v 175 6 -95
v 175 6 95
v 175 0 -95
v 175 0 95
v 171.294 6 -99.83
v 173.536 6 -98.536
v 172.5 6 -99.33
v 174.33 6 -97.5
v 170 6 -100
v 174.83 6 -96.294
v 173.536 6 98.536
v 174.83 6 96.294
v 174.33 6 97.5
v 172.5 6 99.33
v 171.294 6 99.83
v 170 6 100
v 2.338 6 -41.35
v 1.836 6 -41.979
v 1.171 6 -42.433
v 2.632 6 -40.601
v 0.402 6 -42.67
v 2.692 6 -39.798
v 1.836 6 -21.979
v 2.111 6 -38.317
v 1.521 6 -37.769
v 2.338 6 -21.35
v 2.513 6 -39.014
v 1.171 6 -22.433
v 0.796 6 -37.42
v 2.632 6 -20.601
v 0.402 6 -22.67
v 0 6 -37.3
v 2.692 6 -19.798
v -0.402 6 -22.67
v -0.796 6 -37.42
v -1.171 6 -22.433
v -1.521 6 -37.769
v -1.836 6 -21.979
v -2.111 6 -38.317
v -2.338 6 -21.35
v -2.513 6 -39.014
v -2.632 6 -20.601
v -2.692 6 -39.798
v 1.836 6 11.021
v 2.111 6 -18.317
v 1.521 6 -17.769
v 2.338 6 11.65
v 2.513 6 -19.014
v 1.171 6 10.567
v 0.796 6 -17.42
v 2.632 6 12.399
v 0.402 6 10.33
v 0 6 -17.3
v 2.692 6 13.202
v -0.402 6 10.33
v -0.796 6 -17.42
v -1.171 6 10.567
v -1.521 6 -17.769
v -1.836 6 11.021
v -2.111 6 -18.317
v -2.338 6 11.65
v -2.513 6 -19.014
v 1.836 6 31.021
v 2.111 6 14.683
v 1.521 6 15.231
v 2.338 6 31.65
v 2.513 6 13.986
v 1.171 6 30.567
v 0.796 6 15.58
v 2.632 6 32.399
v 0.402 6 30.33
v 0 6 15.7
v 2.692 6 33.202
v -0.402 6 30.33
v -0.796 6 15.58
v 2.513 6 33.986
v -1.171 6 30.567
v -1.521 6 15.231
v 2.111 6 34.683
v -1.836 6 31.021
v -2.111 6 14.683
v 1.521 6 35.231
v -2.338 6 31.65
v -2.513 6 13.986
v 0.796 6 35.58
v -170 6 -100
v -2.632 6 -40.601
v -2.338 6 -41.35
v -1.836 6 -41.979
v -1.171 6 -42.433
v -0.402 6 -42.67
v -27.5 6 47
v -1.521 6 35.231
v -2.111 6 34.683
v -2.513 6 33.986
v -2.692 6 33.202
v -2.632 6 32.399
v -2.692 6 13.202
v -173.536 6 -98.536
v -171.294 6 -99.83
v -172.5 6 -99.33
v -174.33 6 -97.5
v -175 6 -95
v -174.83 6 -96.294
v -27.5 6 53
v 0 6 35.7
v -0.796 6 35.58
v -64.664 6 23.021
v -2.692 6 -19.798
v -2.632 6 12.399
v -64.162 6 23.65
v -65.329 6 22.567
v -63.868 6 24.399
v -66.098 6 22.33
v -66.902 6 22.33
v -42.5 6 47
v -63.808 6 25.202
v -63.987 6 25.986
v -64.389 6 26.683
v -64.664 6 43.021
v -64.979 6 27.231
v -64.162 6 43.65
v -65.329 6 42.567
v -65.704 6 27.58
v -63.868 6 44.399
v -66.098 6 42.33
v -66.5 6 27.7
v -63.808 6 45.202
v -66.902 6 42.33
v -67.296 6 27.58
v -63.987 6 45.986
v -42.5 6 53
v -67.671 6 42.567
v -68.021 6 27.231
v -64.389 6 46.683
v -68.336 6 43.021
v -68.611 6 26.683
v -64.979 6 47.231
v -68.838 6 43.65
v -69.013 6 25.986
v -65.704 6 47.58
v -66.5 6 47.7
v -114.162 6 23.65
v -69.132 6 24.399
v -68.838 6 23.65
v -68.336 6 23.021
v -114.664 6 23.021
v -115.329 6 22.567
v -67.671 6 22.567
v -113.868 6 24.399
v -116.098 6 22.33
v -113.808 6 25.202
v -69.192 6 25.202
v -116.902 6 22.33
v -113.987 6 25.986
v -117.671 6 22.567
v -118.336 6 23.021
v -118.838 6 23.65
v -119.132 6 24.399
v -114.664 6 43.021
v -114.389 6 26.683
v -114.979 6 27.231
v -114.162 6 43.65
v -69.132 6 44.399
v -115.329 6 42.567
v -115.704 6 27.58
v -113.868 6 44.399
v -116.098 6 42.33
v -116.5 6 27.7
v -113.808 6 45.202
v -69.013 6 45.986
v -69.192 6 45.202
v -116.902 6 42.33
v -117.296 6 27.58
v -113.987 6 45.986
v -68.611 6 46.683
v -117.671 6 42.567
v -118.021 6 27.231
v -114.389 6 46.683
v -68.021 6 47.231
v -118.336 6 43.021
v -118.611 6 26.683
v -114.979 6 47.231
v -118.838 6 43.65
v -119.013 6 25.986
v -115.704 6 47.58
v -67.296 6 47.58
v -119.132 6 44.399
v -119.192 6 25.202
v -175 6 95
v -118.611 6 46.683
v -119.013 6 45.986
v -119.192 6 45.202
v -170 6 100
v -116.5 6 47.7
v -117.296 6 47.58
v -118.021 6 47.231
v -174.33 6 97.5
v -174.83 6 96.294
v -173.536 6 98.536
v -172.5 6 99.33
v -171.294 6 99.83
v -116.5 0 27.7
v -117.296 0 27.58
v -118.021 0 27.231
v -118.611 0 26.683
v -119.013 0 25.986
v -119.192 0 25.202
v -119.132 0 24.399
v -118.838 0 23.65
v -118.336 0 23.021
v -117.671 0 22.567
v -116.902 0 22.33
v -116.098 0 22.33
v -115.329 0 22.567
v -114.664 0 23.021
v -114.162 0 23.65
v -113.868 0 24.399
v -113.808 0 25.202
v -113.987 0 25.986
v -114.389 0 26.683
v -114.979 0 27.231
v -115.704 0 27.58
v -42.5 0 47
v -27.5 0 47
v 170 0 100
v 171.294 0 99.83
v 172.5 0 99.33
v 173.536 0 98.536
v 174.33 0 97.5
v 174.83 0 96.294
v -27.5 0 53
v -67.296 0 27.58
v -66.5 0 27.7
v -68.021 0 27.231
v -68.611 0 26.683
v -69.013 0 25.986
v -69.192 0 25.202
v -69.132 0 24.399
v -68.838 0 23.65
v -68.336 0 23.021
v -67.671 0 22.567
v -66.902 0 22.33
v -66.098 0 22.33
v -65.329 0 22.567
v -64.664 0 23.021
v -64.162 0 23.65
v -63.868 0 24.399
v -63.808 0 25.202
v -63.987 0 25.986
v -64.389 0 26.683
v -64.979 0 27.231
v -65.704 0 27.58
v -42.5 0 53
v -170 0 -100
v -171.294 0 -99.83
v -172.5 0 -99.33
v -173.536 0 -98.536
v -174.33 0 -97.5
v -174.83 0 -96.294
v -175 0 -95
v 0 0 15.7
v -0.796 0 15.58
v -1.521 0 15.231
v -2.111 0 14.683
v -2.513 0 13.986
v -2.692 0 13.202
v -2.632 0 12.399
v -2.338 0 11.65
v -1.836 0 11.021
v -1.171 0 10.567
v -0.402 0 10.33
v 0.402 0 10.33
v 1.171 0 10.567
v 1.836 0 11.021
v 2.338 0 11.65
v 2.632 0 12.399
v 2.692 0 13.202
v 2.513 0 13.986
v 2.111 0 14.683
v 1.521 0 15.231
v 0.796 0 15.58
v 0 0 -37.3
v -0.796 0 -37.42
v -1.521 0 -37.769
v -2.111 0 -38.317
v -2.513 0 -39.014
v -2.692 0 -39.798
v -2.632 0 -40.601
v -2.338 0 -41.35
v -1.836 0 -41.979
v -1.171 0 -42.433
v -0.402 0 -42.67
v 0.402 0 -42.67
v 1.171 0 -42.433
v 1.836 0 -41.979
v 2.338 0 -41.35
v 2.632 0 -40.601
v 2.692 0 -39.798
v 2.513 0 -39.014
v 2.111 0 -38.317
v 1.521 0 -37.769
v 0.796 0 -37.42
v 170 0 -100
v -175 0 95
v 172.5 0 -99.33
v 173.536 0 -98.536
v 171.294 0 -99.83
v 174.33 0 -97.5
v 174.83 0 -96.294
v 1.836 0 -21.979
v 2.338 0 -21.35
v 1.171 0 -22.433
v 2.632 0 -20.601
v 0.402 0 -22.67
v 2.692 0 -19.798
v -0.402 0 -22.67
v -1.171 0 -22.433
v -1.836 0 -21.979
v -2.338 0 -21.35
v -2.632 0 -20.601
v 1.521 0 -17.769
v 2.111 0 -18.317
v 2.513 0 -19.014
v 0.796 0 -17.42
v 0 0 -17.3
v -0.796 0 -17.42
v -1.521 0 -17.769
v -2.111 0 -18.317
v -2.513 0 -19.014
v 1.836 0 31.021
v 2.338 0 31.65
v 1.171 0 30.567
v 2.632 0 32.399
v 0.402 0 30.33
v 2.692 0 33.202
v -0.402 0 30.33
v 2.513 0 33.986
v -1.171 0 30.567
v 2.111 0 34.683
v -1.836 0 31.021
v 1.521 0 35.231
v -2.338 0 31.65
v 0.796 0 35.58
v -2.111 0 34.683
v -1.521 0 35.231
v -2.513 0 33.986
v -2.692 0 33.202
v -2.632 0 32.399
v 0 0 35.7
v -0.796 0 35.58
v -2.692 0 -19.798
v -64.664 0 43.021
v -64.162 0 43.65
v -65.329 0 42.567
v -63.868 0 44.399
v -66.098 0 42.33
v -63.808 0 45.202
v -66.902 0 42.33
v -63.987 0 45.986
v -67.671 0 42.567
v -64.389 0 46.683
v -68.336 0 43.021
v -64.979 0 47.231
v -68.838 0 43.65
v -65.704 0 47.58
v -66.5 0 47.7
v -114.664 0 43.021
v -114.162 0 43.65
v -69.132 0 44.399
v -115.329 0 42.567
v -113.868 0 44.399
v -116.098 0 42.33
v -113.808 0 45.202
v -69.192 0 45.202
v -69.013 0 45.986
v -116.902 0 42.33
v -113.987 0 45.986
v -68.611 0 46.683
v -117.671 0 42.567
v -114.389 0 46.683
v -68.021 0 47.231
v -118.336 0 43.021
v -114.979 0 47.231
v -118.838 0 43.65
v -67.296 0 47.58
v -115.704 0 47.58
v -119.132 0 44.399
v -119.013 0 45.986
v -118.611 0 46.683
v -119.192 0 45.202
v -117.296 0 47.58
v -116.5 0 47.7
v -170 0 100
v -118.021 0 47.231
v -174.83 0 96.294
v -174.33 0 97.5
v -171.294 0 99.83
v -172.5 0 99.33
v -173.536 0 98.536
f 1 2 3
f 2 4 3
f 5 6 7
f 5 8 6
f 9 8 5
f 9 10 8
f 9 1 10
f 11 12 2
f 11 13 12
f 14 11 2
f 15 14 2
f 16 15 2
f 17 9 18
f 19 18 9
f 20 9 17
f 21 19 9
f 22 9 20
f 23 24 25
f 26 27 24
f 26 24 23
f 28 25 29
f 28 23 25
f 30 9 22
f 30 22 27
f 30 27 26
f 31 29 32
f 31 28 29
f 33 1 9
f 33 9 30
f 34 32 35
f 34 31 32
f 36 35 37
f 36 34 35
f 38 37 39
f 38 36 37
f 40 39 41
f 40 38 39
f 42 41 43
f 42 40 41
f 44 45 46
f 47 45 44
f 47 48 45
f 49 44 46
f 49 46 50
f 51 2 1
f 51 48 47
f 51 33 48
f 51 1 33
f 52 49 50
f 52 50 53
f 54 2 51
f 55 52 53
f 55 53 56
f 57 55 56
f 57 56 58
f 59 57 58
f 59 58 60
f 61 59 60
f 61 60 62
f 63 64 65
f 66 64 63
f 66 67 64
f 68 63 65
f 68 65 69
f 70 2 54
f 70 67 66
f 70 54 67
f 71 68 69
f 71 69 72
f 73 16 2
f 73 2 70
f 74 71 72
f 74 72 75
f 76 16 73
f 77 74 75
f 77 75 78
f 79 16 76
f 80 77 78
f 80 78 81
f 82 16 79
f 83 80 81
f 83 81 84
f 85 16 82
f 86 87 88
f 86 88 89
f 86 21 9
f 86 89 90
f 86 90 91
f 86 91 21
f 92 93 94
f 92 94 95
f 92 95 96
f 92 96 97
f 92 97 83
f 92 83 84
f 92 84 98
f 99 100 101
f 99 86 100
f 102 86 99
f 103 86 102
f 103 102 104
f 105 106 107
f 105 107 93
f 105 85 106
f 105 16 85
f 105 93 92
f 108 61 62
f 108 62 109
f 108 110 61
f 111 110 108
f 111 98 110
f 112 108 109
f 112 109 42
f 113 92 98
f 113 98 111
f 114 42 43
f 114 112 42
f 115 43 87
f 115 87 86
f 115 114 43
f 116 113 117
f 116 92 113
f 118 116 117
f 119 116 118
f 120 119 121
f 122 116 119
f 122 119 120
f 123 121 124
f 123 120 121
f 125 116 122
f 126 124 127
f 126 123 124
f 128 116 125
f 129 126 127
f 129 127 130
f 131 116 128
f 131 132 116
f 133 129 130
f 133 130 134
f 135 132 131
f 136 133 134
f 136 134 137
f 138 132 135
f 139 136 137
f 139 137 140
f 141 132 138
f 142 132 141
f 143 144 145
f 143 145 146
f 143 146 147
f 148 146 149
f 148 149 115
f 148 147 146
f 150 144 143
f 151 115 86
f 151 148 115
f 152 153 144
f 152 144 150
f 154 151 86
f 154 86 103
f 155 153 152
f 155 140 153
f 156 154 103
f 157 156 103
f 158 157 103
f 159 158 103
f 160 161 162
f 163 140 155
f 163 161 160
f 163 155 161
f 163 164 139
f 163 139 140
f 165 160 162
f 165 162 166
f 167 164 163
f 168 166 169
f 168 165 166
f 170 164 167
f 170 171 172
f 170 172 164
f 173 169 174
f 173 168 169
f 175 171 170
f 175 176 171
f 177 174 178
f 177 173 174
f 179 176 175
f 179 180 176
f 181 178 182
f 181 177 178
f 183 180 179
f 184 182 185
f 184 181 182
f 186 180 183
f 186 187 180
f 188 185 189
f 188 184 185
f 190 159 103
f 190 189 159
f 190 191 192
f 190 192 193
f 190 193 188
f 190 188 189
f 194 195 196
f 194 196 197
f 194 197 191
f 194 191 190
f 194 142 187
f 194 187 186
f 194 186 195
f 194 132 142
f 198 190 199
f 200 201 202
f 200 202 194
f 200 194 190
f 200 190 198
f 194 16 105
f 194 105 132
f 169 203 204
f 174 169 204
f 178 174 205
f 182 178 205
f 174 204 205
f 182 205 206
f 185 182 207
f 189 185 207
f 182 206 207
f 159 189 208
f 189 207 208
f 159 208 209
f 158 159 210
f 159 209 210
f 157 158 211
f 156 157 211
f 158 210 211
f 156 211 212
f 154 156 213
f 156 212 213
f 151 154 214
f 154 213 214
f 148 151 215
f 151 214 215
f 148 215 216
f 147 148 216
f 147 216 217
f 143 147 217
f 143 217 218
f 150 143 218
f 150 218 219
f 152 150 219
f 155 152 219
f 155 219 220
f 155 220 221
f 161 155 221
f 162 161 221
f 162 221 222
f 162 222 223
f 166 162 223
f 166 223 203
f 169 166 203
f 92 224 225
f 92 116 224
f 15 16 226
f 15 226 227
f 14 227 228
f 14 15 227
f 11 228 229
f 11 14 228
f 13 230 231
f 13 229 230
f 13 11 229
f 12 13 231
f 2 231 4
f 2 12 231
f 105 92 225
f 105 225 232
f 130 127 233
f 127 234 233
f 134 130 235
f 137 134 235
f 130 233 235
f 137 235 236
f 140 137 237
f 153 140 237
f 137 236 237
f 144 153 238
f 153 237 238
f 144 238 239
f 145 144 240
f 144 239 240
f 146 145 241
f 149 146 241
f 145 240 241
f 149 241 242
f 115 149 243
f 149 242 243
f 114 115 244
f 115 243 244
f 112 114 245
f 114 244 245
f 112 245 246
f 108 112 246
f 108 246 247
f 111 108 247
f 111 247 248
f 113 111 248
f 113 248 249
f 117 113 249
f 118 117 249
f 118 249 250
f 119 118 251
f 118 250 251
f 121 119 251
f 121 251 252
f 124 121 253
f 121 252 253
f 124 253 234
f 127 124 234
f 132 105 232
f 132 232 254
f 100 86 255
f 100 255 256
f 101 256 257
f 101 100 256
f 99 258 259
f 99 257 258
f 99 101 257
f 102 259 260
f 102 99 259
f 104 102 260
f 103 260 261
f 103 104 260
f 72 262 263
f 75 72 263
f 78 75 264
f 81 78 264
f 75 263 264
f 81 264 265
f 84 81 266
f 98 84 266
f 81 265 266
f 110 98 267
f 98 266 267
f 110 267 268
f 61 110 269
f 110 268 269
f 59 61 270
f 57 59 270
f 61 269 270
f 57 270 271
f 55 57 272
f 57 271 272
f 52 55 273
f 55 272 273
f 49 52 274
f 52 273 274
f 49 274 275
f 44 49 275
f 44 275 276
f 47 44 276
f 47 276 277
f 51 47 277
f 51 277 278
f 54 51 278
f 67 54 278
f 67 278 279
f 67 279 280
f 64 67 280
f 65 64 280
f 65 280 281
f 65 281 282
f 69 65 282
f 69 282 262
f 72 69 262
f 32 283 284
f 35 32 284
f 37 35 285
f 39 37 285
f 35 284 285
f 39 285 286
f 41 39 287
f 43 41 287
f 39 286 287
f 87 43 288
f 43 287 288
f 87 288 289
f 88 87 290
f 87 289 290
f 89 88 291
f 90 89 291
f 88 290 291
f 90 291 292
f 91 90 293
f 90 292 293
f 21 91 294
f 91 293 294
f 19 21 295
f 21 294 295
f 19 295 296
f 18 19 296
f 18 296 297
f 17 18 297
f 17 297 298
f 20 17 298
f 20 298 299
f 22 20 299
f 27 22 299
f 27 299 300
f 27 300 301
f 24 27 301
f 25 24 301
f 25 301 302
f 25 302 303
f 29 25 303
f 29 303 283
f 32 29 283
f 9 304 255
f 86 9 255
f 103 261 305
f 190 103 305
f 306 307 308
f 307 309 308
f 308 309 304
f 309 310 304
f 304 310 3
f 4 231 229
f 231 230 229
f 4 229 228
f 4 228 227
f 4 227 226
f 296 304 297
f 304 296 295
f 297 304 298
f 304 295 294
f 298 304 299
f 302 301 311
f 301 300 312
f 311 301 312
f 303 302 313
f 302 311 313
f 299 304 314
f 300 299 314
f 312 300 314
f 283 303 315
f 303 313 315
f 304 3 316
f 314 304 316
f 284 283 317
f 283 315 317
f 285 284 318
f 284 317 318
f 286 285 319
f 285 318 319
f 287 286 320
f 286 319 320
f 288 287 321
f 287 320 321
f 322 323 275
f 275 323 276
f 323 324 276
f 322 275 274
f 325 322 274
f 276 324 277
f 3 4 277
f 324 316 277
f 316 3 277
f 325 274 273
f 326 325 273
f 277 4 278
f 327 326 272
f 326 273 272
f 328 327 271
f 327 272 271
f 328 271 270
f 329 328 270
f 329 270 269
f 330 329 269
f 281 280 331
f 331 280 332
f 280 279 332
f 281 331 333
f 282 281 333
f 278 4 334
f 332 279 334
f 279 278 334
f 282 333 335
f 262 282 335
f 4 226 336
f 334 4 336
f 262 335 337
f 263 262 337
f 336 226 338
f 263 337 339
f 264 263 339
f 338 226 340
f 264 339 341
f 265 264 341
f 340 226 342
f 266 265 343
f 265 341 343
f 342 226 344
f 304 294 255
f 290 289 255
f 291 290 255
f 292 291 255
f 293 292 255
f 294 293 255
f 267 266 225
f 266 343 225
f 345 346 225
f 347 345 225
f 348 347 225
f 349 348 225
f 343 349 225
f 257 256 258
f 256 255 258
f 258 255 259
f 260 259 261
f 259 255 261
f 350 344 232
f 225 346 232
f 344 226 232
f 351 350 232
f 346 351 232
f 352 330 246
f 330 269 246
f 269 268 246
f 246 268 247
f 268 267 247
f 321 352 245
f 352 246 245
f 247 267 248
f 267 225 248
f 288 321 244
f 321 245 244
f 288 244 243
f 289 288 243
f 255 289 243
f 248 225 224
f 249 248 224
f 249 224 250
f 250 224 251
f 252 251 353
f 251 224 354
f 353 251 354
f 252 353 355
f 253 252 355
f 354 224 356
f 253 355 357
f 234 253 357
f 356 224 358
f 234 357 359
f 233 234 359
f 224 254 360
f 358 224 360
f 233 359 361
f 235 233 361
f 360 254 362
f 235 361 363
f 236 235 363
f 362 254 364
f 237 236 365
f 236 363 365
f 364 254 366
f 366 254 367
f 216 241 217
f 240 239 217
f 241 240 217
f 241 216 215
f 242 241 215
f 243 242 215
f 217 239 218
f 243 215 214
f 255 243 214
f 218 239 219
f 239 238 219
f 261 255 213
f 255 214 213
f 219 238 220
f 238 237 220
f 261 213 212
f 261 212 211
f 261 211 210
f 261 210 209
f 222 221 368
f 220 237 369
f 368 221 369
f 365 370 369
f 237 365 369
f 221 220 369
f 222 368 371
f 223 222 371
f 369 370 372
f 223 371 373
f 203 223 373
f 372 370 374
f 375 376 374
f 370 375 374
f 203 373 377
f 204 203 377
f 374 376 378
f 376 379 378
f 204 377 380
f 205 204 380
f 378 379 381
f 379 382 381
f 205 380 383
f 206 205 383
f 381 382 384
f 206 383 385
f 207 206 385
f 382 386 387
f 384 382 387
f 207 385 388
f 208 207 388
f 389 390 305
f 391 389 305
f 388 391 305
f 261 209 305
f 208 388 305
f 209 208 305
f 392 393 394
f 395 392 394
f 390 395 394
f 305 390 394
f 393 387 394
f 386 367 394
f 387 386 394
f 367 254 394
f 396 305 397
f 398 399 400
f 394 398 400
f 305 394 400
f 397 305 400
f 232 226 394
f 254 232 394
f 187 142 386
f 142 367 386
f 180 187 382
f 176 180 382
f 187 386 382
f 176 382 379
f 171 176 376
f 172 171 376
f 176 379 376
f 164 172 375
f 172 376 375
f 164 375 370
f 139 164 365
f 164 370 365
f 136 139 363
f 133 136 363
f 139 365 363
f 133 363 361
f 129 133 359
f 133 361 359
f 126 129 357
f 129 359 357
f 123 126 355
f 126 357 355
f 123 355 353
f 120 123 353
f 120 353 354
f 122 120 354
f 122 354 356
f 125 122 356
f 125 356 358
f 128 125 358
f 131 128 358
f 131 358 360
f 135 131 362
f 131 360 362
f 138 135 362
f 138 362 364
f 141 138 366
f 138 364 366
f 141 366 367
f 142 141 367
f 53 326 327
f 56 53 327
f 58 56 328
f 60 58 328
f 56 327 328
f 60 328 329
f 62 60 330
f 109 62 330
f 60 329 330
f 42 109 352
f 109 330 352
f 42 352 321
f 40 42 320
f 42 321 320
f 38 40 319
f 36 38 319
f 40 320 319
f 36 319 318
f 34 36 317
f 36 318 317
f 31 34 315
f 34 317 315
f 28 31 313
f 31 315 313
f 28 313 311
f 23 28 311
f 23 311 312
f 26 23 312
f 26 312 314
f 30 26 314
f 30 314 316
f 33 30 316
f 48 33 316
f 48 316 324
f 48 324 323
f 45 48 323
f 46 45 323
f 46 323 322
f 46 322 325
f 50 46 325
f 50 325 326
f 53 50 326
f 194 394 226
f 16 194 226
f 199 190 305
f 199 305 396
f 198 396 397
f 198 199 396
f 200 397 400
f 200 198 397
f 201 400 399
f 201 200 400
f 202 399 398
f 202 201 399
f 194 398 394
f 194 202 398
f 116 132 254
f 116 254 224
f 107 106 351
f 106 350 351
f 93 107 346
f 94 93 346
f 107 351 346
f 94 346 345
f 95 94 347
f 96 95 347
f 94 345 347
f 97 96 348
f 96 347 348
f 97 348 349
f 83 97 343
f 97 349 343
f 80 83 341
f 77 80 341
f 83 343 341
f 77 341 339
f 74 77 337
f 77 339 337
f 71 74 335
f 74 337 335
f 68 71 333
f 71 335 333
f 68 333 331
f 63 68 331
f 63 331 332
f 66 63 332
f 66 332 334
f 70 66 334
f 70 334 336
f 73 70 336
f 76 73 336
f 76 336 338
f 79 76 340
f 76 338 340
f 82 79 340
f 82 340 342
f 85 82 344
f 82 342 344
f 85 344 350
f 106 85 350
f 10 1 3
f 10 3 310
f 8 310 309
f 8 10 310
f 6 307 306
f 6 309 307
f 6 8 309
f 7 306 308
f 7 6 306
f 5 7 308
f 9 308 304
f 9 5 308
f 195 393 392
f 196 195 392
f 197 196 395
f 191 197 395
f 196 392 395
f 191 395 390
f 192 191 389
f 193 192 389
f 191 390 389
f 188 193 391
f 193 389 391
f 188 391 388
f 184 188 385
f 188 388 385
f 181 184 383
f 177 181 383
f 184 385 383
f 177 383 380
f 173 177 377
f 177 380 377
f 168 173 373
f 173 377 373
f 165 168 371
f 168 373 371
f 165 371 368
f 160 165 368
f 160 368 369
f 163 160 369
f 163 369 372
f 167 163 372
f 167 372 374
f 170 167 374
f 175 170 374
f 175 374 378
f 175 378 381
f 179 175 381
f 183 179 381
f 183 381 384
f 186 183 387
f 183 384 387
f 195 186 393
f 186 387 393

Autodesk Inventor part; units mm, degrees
ref_plane "YZ Plane" through (0, 0, 0) normal (1, 0, 0) x (0, 1, 0)
ref_plane "XZ Plane" through (0, 0, 0) normal (0, 1, 0) x (-1, 0, 0)
ref_plane "XY Plane" through (0, 0, 0) normal (0, 0, 1) x (1, 0, 0)
sketch "Sketch1" plane through (0, 0, 0) normal (0, 1, 0) x (-1, 0, 0)
  line L0 (175, 100) -> (-175, 100)
  line L1 (-175, 100) -> (-175, -100)
  line L2 (-175, -100) -> (175, -100)
  line L3 (175, -100) -> (175, 100)
  line L4 (175, 100) -> (-175, -100) construction
  line L5 (-175, 100) -> (175, -100) construction
  point P0 (0, 0)
  dimension "d0" = 350
  dimension "d1" = 200
extrude "Extrusion1" add sketch "Sketch1" along normal blind 6
fillet "Fillet1" radius 5 4 edges at (175, 3, 100) (175, 3, -100) (-175, 3, 100) (-175, 3, -100)
sketch "Sketch2" plane through (0, 6, 0) normal (0, 1, 0) x (1, 0, 0)
  line L0 (70.7569, -69.3202) -> (168.4517, -69.3202) construction
  line L1 (168.4517, -69.3202) -> (168.4517, -91.5888) construction
  line L2 (168.4517, -91.5888) -> (70.7569, -91.5888) construction
  line L3 (70.7569, -91.5888) -> (70.7569, -69.3202) construction
  point P0 (0, 0)
sketch "Sketch3" plane through (0, 6, 0) normal (0, 1, 0) x (1, 0, 0)
  line L0 (-175, 95) -> (-175, -95) projected
  line L1 (-170, -100) -> (170, -100) projected
  line L2 (170, 100) -> (-170, 100) projected
  line L3 (-42.5, -47) -> (-27.5, -47)
  line L4 (-27.5, -47) -> (-27.5, -53)
  line L5 (-27.5, -53) -> (-42.5, -53)
  line L6 (-42.5, -53) -> (-42.5, -47)
  line L7 (-42.5, -47) -> (-27.5, -53) construction
  line L8 (-27.5, -47) -> (-42.5, -53) construction
  line L9 (0, 140) -> (0, -140) projected
  line L10 (245, 0) -> (-245, 0) projected
  point P0 (0, 0)
  point P1 (0, 20)
  point P2 (0, 40)
  point P3 (0, -13)
  point P4 (0, -33)
  point P5 (-116.5, -45)
  point P6 (-116.5, -25)
  point P7 (-66.5, -25)
  point P8 (-66.5, -45)
  point P9 (-35, -50)
  dimension "d7" = 20
  dimension "d8" = 20
  dimension "d18" = 20
  dimension "d19" = 20
  dimension "d20" = 50
  dimension "d21" = 58.5
  dimension "d22" = 55
  dimension "d23" = 60
  dimension "d24" = 33
  dimension "d25" = 15
  dimension "d26" = 6
  dimension "d27" = 35
  dimension "d30" = 50
hole "Hole1" at (0, 6, -40) at (0, 6, 33) at (0, 6, 13) at (0, 6, -20) at (-116.5, 6, 45) at (-116.5, 6, 25) at (-66.5, 6, 25) at (-66.5, 6, 45) direction (0, -1, 0) diameter 5.4 end through all
extrude "Extrusion2" cut sketch "Sketch3" against normal through all
equation "\"d8\" = d7"
equation "\"d19\" = d18"
properties part number "base"
